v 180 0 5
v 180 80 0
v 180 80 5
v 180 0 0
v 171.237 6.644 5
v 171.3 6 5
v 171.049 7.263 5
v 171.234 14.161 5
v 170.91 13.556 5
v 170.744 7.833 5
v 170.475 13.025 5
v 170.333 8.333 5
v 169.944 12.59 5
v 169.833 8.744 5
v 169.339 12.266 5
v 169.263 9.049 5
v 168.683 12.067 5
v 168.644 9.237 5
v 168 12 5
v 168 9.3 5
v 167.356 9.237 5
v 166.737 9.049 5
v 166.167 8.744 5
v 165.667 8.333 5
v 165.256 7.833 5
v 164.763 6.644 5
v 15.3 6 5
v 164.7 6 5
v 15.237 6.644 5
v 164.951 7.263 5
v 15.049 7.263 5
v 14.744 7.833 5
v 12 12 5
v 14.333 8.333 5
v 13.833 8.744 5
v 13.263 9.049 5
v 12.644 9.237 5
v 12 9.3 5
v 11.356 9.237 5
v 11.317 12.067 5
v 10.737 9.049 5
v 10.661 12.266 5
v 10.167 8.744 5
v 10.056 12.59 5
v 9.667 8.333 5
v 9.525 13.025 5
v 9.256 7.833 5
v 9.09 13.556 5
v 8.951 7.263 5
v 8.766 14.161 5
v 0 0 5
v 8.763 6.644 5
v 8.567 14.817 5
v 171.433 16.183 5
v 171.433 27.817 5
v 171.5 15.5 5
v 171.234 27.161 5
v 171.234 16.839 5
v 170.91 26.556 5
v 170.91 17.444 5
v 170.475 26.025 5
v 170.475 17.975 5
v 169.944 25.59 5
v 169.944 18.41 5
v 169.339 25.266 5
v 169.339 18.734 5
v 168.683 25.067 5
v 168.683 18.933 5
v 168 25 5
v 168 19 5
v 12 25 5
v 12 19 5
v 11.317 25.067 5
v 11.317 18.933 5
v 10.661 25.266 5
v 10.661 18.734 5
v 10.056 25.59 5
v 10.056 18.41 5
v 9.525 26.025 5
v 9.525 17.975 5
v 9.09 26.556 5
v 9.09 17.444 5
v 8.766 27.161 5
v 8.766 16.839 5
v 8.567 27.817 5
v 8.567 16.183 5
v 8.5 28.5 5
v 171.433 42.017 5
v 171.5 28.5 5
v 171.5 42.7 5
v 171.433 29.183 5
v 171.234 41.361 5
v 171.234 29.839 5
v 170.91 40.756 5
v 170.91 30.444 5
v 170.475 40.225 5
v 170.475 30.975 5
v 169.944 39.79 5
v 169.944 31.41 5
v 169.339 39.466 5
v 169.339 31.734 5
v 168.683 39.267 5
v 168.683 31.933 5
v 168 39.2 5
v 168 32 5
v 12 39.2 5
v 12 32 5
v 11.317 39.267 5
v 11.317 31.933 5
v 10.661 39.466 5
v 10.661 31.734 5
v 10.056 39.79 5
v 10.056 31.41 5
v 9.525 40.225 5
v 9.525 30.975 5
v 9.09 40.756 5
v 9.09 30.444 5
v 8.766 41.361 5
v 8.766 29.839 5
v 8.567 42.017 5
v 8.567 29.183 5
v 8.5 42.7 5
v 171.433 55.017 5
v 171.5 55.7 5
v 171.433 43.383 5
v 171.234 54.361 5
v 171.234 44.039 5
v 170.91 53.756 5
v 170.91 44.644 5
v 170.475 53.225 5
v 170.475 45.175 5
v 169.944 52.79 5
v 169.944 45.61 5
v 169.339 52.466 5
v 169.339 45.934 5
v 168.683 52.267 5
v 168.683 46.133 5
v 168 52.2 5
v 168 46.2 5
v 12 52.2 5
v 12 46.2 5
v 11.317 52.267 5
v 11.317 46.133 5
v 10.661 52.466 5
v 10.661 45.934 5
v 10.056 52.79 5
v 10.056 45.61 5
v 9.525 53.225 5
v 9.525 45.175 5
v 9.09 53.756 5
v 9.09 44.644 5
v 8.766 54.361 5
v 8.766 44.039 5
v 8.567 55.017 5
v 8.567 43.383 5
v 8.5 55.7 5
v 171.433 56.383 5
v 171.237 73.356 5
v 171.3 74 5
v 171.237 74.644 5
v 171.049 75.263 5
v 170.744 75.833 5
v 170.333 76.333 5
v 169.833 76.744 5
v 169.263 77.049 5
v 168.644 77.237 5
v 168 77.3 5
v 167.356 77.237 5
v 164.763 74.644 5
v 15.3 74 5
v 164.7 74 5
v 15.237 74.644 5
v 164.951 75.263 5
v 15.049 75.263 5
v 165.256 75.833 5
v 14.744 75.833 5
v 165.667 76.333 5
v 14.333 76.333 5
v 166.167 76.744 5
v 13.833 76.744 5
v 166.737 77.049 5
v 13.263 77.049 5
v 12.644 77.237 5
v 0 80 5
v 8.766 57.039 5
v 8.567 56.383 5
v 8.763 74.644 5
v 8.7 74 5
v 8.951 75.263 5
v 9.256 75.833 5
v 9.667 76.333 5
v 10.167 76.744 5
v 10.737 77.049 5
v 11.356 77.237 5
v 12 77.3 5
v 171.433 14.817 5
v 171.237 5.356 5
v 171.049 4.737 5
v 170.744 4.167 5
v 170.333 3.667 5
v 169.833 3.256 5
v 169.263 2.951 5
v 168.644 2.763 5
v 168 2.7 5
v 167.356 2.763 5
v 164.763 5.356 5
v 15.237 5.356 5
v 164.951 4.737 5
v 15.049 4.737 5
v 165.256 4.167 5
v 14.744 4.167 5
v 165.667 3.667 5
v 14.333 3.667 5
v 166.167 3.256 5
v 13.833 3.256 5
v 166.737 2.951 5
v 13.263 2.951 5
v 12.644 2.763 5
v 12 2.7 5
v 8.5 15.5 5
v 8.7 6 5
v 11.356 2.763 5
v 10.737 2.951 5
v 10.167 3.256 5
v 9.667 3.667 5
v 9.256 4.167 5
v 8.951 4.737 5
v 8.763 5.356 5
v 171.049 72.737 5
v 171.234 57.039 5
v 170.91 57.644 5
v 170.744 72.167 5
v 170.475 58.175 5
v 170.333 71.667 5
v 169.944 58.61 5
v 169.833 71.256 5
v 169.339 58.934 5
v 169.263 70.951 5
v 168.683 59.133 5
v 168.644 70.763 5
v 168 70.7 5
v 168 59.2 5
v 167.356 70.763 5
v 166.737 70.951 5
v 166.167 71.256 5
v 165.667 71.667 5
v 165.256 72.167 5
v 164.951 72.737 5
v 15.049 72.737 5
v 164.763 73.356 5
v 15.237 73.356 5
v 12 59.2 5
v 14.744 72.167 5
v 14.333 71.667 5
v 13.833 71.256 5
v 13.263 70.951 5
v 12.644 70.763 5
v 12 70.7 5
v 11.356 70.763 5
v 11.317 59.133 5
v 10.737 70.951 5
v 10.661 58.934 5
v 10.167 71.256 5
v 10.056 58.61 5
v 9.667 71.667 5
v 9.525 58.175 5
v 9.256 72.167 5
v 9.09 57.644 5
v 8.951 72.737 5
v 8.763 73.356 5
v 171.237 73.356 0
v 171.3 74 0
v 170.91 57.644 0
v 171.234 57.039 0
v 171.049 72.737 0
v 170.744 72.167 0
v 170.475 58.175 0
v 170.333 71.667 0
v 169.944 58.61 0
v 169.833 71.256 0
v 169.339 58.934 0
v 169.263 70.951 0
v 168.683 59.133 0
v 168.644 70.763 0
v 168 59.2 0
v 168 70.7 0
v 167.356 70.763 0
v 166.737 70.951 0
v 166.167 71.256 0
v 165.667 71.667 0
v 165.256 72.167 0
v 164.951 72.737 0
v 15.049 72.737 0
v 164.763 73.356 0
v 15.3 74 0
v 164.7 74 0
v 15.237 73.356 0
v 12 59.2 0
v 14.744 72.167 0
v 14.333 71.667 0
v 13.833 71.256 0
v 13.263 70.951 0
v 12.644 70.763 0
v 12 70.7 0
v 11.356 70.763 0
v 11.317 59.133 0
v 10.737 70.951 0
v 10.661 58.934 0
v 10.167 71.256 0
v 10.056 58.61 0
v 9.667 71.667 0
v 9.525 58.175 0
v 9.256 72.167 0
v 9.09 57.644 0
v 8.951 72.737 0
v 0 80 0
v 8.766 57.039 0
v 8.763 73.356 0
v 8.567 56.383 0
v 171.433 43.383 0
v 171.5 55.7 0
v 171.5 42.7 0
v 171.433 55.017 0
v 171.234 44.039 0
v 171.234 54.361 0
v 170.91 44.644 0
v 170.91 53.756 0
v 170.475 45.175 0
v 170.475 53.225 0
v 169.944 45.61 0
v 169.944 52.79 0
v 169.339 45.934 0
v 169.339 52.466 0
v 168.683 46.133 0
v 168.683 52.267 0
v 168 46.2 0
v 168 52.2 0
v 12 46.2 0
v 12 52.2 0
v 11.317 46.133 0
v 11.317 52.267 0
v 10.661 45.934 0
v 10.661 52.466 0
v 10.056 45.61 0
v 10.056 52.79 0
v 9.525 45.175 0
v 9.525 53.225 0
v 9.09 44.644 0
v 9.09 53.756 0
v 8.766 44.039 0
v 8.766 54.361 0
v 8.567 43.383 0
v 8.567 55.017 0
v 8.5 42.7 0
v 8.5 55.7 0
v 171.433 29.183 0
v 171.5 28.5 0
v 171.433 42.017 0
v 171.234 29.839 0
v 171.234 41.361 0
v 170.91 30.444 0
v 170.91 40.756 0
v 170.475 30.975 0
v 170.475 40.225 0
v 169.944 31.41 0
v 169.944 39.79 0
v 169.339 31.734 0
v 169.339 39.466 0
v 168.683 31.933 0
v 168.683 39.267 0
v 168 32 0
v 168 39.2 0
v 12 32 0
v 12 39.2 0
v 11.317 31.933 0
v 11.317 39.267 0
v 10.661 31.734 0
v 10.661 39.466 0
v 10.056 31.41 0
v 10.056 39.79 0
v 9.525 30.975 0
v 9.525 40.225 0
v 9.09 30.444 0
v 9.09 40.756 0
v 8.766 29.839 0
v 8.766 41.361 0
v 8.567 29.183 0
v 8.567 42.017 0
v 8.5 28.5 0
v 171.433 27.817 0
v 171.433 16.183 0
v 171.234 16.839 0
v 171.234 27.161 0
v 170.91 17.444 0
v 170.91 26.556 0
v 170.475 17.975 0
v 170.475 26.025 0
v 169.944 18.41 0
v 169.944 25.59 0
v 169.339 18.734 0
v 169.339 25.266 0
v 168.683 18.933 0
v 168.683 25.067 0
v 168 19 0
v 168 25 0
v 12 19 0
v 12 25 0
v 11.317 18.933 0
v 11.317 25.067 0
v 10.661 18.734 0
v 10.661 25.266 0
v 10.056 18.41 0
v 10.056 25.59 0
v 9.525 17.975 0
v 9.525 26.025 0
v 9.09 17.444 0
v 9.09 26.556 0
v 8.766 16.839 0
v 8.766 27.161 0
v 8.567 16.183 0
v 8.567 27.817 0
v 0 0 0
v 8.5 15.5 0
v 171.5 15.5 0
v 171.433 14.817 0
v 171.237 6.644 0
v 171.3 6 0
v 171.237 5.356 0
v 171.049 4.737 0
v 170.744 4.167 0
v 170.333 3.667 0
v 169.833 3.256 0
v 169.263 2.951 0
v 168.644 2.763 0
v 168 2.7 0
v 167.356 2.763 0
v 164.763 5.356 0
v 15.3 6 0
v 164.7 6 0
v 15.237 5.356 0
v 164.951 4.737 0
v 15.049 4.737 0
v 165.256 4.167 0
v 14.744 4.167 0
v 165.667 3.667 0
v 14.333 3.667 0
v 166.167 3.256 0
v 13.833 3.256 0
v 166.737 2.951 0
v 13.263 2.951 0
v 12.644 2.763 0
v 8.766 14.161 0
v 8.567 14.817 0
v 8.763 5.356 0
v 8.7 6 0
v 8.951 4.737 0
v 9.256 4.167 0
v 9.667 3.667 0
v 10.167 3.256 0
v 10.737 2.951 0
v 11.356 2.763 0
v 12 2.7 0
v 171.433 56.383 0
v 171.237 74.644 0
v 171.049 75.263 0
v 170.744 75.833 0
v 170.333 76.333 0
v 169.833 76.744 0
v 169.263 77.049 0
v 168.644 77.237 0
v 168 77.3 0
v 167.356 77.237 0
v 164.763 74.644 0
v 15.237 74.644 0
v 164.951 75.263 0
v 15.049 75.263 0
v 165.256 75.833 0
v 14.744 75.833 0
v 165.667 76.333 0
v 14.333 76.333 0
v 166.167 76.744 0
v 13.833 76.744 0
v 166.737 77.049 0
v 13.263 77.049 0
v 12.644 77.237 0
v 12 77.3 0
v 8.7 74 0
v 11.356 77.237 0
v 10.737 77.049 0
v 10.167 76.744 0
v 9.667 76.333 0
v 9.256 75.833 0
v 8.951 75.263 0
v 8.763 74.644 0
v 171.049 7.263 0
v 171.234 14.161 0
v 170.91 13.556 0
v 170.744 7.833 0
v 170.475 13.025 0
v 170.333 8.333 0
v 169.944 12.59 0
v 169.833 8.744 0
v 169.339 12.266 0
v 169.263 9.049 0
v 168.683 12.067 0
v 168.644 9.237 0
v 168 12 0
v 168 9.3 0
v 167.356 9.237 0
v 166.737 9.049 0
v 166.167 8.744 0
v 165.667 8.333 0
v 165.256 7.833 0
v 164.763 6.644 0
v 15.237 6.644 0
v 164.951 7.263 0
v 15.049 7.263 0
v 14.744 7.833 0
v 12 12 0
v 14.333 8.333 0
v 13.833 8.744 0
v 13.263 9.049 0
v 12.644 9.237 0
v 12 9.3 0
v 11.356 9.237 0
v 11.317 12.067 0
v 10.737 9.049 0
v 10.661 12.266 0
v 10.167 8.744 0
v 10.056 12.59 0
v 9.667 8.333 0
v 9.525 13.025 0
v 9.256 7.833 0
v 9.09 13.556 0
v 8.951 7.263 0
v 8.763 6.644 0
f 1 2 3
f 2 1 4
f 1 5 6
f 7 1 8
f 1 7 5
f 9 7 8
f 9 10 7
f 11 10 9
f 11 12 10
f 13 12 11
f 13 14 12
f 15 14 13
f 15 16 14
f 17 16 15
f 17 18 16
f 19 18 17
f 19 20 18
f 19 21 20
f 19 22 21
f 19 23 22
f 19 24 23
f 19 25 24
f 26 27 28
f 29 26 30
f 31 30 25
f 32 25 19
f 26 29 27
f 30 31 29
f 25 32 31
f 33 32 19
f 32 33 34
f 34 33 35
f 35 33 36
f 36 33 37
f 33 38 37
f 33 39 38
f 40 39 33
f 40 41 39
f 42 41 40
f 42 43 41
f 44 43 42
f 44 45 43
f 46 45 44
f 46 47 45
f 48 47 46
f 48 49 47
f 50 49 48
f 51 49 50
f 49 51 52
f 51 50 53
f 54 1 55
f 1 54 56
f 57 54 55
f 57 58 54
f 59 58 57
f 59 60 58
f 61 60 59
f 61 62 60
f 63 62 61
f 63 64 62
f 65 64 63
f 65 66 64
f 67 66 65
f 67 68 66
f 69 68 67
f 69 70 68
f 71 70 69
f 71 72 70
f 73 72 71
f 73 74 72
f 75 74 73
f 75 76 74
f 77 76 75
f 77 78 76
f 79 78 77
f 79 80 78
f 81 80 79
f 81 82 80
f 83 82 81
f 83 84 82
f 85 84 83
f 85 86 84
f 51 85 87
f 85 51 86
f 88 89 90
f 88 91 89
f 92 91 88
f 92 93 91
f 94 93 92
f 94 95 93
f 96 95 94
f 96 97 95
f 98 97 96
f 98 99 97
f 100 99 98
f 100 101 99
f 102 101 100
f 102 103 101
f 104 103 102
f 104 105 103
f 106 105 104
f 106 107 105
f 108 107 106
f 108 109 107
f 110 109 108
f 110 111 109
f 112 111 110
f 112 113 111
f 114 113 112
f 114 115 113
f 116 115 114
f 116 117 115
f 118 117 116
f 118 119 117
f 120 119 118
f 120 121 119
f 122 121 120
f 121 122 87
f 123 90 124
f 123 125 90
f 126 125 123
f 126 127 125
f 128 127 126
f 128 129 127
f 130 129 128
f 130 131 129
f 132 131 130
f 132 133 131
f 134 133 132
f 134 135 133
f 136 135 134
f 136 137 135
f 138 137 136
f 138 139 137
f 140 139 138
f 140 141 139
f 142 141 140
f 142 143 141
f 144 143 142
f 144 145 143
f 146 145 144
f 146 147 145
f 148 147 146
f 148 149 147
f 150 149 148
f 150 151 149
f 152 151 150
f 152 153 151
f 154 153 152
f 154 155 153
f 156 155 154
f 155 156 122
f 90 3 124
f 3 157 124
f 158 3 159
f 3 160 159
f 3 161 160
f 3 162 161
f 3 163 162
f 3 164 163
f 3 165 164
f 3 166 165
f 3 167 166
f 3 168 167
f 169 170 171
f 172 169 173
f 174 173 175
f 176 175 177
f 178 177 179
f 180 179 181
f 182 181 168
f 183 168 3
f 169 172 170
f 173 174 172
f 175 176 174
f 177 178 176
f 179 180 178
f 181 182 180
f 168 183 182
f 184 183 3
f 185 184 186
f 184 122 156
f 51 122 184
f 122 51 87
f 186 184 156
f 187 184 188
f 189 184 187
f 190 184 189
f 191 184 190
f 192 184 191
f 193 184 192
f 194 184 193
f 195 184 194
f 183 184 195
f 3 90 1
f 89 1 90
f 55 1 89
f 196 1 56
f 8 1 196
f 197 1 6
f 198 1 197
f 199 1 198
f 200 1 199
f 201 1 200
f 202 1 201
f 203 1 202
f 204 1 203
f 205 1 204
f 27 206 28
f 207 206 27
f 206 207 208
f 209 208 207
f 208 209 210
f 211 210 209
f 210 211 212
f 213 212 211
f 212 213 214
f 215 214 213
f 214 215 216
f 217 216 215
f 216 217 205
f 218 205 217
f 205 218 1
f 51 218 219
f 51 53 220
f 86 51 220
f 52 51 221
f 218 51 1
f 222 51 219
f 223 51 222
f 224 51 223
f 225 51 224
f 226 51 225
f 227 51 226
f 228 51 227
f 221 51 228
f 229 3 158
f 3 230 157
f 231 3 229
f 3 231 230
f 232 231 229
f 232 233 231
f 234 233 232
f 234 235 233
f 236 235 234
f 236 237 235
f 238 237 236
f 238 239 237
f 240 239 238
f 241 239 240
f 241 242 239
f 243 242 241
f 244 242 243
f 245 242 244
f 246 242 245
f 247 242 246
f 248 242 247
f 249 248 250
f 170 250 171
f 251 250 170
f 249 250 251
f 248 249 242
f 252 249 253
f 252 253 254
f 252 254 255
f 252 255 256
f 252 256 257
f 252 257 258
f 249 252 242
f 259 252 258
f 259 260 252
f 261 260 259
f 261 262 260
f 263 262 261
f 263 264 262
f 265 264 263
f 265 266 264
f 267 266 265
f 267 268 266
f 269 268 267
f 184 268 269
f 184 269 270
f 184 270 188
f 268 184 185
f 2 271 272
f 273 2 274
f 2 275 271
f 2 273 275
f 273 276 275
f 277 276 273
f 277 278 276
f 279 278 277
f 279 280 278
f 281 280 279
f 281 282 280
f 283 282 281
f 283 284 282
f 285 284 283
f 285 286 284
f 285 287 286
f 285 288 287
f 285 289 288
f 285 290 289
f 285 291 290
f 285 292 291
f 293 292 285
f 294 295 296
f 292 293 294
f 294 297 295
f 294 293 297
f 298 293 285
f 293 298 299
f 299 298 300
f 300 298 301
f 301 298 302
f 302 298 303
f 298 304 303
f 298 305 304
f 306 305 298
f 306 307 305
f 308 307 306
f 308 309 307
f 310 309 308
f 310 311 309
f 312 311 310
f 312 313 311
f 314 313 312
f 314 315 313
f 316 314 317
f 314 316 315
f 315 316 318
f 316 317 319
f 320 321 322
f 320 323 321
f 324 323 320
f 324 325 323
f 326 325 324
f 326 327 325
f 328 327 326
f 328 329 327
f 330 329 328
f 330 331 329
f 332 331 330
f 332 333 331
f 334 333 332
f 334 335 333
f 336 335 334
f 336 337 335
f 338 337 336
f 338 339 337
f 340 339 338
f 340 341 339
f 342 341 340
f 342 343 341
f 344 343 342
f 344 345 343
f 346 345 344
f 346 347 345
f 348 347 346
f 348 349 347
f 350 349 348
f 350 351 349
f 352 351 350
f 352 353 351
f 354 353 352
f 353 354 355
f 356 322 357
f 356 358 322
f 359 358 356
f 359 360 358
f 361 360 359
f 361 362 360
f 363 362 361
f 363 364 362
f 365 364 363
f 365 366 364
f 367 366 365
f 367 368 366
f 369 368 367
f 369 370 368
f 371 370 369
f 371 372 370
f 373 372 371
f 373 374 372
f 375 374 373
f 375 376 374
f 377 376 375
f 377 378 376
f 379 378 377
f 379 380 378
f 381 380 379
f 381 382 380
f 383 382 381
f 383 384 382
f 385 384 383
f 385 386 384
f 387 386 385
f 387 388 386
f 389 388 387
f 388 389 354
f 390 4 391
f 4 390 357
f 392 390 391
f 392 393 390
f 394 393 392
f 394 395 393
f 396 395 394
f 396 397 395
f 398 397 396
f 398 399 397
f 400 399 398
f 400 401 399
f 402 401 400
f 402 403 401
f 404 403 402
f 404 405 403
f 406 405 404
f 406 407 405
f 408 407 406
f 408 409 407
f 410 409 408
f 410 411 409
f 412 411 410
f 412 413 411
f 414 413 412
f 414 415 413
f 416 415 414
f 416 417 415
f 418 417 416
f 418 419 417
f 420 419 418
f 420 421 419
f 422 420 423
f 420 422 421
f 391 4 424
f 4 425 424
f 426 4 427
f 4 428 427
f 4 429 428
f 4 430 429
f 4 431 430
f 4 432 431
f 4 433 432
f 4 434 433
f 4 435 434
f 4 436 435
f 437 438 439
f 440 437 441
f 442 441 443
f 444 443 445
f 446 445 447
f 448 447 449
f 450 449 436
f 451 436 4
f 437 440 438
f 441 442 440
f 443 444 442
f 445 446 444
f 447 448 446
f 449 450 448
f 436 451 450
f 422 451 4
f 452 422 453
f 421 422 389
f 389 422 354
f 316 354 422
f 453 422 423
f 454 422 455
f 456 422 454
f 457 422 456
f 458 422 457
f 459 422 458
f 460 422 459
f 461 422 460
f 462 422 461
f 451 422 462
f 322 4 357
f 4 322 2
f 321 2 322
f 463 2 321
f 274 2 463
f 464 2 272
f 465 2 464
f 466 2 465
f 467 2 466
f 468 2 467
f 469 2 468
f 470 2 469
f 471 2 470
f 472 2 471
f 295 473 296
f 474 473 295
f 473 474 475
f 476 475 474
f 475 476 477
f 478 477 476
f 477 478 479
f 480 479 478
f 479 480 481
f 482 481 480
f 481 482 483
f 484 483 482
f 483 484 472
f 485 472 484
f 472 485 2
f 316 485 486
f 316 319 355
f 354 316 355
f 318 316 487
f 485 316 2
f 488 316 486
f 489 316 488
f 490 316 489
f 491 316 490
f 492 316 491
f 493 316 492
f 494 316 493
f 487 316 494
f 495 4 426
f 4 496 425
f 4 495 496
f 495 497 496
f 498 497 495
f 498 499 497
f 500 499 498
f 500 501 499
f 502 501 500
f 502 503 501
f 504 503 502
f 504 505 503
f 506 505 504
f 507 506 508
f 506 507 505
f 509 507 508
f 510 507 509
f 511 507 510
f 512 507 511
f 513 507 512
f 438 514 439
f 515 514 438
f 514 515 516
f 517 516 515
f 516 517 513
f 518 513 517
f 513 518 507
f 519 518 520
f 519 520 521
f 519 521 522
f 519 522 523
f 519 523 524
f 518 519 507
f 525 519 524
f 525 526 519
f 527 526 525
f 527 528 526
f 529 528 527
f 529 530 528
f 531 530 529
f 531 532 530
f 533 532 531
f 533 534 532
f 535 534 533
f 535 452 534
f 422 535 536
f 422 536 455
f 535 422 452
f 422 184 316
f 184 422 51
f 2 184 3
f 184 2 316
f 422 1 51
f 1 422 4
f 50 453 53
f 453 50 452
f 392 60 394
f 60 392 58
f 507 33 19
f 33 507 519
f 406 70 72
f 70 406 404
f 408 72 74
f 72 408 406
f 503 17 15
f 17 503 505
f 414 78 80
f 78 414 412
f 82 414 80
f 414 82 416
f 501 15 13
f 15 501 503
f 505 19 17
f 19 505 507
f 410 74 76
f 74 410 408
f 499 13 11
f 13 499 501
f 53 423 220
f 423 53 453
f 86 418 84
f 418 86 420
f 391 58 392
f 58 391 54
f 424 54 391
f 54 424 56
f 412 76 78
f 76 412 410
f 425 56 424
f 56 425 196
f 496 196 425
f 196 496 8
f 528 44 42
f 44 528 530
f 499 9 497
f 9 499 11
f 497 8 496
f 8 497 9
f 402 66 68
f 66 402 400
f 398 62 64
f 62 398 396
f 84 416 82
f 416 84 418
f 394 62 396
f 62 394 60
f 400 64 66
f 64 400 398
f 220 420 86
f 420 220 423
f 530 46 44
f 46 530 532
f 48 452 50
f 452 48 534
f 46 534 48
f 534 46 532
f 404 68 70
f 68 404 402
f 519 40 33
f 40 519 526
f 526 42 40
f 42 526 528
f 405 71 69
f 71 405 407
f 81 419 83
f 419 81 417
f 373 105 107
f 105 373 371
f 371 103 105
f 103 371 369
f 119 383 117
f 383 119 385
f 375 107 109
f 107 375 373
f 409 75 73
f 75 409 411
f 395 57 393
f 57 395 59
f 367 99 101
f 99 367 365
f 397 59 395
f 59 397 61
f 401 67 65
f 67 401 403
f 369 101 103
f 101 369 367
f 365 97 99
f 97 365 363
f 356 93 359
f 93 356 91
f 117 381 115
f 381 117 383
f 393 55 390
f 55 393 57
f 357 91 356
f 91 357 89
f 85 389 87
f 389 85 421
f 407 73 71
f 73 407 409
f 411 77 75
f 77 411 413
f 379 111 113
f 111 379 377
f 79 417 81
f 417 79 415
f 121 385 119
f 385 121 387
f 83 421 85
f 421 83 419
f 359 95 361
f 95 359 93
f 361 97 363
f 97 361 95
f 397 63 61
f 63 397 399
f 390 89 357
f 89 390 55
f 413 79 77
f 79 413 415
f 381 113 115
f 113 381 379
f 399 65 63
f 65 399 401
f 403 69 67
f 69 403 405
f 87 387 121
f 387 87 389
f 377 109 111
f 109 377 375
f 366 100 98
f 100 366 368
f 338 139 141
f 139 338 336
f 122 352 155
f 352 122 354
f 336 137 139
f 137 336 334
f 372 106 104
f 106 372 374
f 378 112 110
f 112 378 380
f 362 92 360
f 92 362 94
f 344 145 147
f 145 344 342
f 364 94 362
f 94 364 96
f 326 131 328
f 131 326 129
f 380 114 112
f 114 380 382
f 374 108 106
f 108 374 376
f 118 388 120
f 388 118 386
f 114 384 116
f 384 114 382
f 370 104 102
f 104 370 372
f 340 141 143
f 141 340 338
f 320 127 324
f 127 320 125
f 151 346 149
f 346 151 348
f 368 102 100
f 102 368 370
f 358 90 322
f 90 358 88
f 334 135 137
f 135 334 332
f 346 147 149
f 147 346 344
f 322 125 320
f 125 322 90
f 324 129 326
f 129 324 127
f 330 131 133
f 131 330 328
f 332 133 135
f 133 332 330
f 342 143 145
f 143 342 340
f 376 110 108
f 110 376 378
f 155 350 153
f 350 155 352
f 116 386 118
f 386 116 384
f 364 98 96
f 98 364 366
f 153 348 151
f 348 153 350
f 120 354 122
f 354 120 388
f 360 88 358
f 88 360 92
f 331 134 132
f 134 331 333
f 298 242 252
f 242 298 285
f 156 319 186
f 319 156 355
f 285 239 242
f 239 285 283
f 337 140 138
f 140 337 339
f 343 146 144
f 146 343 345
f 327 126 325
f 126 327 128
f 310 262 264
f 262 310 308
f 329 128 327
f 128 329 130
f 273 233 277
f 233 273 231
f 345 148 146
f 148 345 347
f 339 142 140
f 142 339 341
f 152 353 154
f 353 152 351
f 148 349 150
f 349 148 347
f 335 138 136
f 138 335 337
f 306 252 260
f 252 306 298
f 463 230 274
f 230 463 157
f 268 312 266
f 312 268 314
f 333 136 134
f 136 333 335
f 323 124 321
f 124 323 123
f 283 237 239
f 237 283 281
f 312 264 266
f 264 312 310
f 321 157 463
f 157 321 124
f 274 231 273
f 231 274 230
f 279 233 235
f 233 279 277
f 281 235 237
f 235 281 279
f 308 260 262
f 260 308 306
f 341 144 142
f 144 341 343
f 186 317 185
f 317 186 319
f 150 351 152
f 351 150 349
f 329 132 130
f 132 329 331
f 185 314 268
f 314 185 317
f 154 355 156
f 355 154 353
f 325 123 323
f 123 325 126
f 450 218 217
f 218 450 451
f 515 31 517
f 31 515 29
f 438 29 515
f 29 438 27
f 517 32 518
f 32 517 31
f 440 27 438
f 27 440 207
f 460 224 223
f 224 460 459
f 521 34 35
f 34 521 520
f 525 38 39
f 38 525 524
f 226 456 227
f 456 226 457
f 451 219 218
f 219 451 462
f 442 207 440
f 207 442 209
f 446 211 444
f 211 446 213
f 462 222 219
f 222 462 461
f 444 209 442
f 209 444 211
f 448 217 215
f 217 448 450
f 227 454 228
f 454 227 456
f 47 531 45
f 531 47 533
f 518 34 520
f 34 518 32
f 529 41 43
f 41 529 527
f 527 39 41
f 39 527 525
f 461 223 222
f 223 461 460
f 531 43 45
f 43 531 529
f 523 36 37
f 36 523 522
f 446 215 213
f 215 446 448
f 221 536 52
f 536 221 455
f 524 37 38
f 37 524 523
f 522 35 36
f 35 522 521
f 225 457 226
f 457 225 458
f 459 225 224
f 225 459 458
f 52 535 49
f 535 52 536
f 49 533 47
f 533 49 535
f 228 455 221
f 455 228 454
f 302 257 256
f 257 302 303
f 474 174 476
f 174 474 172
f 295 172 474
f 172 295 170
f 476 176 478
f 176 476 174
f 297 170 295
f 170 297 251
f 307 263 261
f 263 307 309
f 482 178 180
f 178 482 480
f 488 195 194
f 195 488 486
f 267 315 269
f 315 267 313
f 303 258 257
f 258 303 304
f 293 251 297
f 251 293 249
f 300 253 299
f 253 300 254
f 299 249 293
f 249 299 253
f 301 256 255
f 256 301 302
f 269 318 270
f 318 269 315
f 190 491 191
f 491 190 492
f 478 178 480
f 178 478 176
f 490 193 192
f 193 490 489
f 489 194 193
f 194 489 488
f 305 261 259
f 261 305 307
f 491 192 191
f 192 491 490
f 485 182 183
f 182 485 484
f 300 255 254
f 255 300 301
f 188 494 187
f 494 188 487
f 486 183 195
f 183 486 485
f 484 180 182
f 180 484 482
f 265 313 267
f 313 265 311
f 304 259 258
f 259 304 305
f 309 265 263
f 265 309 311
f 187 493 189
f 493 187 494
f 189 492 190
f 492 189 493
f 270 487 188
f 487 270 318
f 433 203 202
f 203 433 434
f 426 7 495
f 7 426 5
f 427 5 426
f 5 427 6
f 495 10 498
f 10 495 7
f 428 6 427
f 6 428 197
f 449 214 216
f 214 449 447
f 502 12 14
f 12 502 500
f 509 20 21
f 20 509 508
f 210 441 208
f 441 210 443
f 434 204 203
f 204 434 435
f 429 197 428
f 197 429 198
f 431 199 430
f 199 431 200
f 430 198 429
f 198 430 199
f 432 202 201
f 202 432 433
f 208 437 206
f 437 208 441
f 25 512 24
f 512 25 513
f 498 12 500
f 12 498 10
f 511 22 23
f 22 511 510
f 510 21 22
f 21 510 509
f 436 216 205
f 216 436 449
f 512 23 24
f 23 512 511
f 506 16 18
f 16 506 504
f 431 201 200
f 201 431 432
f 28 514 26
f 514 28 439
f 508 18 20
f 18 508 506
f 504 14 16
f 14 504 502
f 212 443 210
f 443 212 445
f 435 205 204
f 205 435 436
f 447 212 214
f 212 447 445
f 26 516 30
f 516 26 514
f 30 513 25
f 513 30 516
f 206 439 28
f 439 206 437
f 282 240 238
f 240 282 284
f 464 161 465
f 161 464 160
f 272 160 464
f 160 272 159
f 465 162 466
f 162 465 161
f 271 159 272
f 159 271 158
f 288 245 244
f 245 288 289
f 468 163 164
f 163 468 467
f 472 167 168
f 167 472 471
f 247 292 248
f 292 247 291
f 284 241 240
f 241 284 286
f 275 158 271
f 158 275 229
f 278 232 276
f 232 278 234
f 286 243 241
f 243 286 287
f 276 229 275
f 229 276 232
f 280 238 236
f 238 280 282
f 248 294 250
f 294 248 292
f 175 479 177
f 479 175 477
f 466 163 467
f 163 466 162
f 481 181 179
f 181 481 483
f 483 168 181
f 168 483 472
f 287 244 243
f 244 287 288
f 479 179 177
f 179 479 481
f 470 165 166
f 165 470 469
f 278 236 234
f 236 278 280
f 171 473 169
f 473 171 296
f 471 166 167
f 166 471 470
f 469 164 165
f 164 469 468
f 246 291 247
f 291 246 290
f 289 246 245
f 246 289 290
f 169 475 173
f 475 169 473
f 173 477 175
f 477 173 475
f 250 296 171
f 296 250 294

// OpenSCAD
$fn = 32;

// ----------------------------------------------------------------------
// Slotted panel: 180 x 80 mm, 4 ряда of slots
// ----------------------------------------------------------------------

// --- parameters (mm) ---
panel_w = 180;            // panel width
panel_d = 80;             // panel depth
thick = 5;                // panel thickness
slot_w = 7;               // slot width
pitch0 = 13;              // first row pitch
pitch_step = 1.2;         // pitch increase per row
margin = 12;              // margin around the slot field
rows = 4;                 // number of slot rows
mount_d = 6.6;            // mounting holes
mount_x = 78;             // mounting hole offset

difference() {
  union() {
    cube([panel_w, panel_d, thick]);
  }
  /* slot rows: stadium shaped cutters, 2.5 mm clear of both faces */
  /* row 0: pitch 13, length 156 */
  hull() {
    translate([12, 15.5, -2.5]) cylinder(h = thick + 5, d = slot_w);
    translate([168, 15.5, -2.5]) cylinder(h = thick + 5, d = slot_w);
  }
  /* row 1: pitch 14.2, length 156 */
  hull() {
    translate([12, 28.5, -2.5]) cylinder(h = thick + 5, d = slot_w);
    translate([168, 28.5, -2.5]) cylinder(h = thick + 5, d = slot_w);
  }
  /* row 2: pitch 13, length 156 */
  hull() {
    translate([12, 42.7, -2.5]) cylinder(h = thick + 5, d = slot_w);
    translate([168, 42.7, -2.5]) cylinder(h = thick + 5, d = slot_w);
  }
  /* row 3: pitch 14.2, length 156 */
  hull() {
    translate([12, 55.7, -2.5]) cylinder(h = thick + 5, d = slot_w);
    translate([168, 55.7, -2.5]) cylinder(h = thick + 5, d = slot_w);
  }
  translate([12, 6, -2.5]) cylinder(h = 10, d = mount_d);
  translate([12, 74, -2.5]) cylinder(h = 10, d = mount_d);
  translate([168, 6, -2.5]) cylinder(h = 10, d = mount_d);
  translate([168, 74, -2.5]) cylinder(h = 10, d = mount_d);
}
